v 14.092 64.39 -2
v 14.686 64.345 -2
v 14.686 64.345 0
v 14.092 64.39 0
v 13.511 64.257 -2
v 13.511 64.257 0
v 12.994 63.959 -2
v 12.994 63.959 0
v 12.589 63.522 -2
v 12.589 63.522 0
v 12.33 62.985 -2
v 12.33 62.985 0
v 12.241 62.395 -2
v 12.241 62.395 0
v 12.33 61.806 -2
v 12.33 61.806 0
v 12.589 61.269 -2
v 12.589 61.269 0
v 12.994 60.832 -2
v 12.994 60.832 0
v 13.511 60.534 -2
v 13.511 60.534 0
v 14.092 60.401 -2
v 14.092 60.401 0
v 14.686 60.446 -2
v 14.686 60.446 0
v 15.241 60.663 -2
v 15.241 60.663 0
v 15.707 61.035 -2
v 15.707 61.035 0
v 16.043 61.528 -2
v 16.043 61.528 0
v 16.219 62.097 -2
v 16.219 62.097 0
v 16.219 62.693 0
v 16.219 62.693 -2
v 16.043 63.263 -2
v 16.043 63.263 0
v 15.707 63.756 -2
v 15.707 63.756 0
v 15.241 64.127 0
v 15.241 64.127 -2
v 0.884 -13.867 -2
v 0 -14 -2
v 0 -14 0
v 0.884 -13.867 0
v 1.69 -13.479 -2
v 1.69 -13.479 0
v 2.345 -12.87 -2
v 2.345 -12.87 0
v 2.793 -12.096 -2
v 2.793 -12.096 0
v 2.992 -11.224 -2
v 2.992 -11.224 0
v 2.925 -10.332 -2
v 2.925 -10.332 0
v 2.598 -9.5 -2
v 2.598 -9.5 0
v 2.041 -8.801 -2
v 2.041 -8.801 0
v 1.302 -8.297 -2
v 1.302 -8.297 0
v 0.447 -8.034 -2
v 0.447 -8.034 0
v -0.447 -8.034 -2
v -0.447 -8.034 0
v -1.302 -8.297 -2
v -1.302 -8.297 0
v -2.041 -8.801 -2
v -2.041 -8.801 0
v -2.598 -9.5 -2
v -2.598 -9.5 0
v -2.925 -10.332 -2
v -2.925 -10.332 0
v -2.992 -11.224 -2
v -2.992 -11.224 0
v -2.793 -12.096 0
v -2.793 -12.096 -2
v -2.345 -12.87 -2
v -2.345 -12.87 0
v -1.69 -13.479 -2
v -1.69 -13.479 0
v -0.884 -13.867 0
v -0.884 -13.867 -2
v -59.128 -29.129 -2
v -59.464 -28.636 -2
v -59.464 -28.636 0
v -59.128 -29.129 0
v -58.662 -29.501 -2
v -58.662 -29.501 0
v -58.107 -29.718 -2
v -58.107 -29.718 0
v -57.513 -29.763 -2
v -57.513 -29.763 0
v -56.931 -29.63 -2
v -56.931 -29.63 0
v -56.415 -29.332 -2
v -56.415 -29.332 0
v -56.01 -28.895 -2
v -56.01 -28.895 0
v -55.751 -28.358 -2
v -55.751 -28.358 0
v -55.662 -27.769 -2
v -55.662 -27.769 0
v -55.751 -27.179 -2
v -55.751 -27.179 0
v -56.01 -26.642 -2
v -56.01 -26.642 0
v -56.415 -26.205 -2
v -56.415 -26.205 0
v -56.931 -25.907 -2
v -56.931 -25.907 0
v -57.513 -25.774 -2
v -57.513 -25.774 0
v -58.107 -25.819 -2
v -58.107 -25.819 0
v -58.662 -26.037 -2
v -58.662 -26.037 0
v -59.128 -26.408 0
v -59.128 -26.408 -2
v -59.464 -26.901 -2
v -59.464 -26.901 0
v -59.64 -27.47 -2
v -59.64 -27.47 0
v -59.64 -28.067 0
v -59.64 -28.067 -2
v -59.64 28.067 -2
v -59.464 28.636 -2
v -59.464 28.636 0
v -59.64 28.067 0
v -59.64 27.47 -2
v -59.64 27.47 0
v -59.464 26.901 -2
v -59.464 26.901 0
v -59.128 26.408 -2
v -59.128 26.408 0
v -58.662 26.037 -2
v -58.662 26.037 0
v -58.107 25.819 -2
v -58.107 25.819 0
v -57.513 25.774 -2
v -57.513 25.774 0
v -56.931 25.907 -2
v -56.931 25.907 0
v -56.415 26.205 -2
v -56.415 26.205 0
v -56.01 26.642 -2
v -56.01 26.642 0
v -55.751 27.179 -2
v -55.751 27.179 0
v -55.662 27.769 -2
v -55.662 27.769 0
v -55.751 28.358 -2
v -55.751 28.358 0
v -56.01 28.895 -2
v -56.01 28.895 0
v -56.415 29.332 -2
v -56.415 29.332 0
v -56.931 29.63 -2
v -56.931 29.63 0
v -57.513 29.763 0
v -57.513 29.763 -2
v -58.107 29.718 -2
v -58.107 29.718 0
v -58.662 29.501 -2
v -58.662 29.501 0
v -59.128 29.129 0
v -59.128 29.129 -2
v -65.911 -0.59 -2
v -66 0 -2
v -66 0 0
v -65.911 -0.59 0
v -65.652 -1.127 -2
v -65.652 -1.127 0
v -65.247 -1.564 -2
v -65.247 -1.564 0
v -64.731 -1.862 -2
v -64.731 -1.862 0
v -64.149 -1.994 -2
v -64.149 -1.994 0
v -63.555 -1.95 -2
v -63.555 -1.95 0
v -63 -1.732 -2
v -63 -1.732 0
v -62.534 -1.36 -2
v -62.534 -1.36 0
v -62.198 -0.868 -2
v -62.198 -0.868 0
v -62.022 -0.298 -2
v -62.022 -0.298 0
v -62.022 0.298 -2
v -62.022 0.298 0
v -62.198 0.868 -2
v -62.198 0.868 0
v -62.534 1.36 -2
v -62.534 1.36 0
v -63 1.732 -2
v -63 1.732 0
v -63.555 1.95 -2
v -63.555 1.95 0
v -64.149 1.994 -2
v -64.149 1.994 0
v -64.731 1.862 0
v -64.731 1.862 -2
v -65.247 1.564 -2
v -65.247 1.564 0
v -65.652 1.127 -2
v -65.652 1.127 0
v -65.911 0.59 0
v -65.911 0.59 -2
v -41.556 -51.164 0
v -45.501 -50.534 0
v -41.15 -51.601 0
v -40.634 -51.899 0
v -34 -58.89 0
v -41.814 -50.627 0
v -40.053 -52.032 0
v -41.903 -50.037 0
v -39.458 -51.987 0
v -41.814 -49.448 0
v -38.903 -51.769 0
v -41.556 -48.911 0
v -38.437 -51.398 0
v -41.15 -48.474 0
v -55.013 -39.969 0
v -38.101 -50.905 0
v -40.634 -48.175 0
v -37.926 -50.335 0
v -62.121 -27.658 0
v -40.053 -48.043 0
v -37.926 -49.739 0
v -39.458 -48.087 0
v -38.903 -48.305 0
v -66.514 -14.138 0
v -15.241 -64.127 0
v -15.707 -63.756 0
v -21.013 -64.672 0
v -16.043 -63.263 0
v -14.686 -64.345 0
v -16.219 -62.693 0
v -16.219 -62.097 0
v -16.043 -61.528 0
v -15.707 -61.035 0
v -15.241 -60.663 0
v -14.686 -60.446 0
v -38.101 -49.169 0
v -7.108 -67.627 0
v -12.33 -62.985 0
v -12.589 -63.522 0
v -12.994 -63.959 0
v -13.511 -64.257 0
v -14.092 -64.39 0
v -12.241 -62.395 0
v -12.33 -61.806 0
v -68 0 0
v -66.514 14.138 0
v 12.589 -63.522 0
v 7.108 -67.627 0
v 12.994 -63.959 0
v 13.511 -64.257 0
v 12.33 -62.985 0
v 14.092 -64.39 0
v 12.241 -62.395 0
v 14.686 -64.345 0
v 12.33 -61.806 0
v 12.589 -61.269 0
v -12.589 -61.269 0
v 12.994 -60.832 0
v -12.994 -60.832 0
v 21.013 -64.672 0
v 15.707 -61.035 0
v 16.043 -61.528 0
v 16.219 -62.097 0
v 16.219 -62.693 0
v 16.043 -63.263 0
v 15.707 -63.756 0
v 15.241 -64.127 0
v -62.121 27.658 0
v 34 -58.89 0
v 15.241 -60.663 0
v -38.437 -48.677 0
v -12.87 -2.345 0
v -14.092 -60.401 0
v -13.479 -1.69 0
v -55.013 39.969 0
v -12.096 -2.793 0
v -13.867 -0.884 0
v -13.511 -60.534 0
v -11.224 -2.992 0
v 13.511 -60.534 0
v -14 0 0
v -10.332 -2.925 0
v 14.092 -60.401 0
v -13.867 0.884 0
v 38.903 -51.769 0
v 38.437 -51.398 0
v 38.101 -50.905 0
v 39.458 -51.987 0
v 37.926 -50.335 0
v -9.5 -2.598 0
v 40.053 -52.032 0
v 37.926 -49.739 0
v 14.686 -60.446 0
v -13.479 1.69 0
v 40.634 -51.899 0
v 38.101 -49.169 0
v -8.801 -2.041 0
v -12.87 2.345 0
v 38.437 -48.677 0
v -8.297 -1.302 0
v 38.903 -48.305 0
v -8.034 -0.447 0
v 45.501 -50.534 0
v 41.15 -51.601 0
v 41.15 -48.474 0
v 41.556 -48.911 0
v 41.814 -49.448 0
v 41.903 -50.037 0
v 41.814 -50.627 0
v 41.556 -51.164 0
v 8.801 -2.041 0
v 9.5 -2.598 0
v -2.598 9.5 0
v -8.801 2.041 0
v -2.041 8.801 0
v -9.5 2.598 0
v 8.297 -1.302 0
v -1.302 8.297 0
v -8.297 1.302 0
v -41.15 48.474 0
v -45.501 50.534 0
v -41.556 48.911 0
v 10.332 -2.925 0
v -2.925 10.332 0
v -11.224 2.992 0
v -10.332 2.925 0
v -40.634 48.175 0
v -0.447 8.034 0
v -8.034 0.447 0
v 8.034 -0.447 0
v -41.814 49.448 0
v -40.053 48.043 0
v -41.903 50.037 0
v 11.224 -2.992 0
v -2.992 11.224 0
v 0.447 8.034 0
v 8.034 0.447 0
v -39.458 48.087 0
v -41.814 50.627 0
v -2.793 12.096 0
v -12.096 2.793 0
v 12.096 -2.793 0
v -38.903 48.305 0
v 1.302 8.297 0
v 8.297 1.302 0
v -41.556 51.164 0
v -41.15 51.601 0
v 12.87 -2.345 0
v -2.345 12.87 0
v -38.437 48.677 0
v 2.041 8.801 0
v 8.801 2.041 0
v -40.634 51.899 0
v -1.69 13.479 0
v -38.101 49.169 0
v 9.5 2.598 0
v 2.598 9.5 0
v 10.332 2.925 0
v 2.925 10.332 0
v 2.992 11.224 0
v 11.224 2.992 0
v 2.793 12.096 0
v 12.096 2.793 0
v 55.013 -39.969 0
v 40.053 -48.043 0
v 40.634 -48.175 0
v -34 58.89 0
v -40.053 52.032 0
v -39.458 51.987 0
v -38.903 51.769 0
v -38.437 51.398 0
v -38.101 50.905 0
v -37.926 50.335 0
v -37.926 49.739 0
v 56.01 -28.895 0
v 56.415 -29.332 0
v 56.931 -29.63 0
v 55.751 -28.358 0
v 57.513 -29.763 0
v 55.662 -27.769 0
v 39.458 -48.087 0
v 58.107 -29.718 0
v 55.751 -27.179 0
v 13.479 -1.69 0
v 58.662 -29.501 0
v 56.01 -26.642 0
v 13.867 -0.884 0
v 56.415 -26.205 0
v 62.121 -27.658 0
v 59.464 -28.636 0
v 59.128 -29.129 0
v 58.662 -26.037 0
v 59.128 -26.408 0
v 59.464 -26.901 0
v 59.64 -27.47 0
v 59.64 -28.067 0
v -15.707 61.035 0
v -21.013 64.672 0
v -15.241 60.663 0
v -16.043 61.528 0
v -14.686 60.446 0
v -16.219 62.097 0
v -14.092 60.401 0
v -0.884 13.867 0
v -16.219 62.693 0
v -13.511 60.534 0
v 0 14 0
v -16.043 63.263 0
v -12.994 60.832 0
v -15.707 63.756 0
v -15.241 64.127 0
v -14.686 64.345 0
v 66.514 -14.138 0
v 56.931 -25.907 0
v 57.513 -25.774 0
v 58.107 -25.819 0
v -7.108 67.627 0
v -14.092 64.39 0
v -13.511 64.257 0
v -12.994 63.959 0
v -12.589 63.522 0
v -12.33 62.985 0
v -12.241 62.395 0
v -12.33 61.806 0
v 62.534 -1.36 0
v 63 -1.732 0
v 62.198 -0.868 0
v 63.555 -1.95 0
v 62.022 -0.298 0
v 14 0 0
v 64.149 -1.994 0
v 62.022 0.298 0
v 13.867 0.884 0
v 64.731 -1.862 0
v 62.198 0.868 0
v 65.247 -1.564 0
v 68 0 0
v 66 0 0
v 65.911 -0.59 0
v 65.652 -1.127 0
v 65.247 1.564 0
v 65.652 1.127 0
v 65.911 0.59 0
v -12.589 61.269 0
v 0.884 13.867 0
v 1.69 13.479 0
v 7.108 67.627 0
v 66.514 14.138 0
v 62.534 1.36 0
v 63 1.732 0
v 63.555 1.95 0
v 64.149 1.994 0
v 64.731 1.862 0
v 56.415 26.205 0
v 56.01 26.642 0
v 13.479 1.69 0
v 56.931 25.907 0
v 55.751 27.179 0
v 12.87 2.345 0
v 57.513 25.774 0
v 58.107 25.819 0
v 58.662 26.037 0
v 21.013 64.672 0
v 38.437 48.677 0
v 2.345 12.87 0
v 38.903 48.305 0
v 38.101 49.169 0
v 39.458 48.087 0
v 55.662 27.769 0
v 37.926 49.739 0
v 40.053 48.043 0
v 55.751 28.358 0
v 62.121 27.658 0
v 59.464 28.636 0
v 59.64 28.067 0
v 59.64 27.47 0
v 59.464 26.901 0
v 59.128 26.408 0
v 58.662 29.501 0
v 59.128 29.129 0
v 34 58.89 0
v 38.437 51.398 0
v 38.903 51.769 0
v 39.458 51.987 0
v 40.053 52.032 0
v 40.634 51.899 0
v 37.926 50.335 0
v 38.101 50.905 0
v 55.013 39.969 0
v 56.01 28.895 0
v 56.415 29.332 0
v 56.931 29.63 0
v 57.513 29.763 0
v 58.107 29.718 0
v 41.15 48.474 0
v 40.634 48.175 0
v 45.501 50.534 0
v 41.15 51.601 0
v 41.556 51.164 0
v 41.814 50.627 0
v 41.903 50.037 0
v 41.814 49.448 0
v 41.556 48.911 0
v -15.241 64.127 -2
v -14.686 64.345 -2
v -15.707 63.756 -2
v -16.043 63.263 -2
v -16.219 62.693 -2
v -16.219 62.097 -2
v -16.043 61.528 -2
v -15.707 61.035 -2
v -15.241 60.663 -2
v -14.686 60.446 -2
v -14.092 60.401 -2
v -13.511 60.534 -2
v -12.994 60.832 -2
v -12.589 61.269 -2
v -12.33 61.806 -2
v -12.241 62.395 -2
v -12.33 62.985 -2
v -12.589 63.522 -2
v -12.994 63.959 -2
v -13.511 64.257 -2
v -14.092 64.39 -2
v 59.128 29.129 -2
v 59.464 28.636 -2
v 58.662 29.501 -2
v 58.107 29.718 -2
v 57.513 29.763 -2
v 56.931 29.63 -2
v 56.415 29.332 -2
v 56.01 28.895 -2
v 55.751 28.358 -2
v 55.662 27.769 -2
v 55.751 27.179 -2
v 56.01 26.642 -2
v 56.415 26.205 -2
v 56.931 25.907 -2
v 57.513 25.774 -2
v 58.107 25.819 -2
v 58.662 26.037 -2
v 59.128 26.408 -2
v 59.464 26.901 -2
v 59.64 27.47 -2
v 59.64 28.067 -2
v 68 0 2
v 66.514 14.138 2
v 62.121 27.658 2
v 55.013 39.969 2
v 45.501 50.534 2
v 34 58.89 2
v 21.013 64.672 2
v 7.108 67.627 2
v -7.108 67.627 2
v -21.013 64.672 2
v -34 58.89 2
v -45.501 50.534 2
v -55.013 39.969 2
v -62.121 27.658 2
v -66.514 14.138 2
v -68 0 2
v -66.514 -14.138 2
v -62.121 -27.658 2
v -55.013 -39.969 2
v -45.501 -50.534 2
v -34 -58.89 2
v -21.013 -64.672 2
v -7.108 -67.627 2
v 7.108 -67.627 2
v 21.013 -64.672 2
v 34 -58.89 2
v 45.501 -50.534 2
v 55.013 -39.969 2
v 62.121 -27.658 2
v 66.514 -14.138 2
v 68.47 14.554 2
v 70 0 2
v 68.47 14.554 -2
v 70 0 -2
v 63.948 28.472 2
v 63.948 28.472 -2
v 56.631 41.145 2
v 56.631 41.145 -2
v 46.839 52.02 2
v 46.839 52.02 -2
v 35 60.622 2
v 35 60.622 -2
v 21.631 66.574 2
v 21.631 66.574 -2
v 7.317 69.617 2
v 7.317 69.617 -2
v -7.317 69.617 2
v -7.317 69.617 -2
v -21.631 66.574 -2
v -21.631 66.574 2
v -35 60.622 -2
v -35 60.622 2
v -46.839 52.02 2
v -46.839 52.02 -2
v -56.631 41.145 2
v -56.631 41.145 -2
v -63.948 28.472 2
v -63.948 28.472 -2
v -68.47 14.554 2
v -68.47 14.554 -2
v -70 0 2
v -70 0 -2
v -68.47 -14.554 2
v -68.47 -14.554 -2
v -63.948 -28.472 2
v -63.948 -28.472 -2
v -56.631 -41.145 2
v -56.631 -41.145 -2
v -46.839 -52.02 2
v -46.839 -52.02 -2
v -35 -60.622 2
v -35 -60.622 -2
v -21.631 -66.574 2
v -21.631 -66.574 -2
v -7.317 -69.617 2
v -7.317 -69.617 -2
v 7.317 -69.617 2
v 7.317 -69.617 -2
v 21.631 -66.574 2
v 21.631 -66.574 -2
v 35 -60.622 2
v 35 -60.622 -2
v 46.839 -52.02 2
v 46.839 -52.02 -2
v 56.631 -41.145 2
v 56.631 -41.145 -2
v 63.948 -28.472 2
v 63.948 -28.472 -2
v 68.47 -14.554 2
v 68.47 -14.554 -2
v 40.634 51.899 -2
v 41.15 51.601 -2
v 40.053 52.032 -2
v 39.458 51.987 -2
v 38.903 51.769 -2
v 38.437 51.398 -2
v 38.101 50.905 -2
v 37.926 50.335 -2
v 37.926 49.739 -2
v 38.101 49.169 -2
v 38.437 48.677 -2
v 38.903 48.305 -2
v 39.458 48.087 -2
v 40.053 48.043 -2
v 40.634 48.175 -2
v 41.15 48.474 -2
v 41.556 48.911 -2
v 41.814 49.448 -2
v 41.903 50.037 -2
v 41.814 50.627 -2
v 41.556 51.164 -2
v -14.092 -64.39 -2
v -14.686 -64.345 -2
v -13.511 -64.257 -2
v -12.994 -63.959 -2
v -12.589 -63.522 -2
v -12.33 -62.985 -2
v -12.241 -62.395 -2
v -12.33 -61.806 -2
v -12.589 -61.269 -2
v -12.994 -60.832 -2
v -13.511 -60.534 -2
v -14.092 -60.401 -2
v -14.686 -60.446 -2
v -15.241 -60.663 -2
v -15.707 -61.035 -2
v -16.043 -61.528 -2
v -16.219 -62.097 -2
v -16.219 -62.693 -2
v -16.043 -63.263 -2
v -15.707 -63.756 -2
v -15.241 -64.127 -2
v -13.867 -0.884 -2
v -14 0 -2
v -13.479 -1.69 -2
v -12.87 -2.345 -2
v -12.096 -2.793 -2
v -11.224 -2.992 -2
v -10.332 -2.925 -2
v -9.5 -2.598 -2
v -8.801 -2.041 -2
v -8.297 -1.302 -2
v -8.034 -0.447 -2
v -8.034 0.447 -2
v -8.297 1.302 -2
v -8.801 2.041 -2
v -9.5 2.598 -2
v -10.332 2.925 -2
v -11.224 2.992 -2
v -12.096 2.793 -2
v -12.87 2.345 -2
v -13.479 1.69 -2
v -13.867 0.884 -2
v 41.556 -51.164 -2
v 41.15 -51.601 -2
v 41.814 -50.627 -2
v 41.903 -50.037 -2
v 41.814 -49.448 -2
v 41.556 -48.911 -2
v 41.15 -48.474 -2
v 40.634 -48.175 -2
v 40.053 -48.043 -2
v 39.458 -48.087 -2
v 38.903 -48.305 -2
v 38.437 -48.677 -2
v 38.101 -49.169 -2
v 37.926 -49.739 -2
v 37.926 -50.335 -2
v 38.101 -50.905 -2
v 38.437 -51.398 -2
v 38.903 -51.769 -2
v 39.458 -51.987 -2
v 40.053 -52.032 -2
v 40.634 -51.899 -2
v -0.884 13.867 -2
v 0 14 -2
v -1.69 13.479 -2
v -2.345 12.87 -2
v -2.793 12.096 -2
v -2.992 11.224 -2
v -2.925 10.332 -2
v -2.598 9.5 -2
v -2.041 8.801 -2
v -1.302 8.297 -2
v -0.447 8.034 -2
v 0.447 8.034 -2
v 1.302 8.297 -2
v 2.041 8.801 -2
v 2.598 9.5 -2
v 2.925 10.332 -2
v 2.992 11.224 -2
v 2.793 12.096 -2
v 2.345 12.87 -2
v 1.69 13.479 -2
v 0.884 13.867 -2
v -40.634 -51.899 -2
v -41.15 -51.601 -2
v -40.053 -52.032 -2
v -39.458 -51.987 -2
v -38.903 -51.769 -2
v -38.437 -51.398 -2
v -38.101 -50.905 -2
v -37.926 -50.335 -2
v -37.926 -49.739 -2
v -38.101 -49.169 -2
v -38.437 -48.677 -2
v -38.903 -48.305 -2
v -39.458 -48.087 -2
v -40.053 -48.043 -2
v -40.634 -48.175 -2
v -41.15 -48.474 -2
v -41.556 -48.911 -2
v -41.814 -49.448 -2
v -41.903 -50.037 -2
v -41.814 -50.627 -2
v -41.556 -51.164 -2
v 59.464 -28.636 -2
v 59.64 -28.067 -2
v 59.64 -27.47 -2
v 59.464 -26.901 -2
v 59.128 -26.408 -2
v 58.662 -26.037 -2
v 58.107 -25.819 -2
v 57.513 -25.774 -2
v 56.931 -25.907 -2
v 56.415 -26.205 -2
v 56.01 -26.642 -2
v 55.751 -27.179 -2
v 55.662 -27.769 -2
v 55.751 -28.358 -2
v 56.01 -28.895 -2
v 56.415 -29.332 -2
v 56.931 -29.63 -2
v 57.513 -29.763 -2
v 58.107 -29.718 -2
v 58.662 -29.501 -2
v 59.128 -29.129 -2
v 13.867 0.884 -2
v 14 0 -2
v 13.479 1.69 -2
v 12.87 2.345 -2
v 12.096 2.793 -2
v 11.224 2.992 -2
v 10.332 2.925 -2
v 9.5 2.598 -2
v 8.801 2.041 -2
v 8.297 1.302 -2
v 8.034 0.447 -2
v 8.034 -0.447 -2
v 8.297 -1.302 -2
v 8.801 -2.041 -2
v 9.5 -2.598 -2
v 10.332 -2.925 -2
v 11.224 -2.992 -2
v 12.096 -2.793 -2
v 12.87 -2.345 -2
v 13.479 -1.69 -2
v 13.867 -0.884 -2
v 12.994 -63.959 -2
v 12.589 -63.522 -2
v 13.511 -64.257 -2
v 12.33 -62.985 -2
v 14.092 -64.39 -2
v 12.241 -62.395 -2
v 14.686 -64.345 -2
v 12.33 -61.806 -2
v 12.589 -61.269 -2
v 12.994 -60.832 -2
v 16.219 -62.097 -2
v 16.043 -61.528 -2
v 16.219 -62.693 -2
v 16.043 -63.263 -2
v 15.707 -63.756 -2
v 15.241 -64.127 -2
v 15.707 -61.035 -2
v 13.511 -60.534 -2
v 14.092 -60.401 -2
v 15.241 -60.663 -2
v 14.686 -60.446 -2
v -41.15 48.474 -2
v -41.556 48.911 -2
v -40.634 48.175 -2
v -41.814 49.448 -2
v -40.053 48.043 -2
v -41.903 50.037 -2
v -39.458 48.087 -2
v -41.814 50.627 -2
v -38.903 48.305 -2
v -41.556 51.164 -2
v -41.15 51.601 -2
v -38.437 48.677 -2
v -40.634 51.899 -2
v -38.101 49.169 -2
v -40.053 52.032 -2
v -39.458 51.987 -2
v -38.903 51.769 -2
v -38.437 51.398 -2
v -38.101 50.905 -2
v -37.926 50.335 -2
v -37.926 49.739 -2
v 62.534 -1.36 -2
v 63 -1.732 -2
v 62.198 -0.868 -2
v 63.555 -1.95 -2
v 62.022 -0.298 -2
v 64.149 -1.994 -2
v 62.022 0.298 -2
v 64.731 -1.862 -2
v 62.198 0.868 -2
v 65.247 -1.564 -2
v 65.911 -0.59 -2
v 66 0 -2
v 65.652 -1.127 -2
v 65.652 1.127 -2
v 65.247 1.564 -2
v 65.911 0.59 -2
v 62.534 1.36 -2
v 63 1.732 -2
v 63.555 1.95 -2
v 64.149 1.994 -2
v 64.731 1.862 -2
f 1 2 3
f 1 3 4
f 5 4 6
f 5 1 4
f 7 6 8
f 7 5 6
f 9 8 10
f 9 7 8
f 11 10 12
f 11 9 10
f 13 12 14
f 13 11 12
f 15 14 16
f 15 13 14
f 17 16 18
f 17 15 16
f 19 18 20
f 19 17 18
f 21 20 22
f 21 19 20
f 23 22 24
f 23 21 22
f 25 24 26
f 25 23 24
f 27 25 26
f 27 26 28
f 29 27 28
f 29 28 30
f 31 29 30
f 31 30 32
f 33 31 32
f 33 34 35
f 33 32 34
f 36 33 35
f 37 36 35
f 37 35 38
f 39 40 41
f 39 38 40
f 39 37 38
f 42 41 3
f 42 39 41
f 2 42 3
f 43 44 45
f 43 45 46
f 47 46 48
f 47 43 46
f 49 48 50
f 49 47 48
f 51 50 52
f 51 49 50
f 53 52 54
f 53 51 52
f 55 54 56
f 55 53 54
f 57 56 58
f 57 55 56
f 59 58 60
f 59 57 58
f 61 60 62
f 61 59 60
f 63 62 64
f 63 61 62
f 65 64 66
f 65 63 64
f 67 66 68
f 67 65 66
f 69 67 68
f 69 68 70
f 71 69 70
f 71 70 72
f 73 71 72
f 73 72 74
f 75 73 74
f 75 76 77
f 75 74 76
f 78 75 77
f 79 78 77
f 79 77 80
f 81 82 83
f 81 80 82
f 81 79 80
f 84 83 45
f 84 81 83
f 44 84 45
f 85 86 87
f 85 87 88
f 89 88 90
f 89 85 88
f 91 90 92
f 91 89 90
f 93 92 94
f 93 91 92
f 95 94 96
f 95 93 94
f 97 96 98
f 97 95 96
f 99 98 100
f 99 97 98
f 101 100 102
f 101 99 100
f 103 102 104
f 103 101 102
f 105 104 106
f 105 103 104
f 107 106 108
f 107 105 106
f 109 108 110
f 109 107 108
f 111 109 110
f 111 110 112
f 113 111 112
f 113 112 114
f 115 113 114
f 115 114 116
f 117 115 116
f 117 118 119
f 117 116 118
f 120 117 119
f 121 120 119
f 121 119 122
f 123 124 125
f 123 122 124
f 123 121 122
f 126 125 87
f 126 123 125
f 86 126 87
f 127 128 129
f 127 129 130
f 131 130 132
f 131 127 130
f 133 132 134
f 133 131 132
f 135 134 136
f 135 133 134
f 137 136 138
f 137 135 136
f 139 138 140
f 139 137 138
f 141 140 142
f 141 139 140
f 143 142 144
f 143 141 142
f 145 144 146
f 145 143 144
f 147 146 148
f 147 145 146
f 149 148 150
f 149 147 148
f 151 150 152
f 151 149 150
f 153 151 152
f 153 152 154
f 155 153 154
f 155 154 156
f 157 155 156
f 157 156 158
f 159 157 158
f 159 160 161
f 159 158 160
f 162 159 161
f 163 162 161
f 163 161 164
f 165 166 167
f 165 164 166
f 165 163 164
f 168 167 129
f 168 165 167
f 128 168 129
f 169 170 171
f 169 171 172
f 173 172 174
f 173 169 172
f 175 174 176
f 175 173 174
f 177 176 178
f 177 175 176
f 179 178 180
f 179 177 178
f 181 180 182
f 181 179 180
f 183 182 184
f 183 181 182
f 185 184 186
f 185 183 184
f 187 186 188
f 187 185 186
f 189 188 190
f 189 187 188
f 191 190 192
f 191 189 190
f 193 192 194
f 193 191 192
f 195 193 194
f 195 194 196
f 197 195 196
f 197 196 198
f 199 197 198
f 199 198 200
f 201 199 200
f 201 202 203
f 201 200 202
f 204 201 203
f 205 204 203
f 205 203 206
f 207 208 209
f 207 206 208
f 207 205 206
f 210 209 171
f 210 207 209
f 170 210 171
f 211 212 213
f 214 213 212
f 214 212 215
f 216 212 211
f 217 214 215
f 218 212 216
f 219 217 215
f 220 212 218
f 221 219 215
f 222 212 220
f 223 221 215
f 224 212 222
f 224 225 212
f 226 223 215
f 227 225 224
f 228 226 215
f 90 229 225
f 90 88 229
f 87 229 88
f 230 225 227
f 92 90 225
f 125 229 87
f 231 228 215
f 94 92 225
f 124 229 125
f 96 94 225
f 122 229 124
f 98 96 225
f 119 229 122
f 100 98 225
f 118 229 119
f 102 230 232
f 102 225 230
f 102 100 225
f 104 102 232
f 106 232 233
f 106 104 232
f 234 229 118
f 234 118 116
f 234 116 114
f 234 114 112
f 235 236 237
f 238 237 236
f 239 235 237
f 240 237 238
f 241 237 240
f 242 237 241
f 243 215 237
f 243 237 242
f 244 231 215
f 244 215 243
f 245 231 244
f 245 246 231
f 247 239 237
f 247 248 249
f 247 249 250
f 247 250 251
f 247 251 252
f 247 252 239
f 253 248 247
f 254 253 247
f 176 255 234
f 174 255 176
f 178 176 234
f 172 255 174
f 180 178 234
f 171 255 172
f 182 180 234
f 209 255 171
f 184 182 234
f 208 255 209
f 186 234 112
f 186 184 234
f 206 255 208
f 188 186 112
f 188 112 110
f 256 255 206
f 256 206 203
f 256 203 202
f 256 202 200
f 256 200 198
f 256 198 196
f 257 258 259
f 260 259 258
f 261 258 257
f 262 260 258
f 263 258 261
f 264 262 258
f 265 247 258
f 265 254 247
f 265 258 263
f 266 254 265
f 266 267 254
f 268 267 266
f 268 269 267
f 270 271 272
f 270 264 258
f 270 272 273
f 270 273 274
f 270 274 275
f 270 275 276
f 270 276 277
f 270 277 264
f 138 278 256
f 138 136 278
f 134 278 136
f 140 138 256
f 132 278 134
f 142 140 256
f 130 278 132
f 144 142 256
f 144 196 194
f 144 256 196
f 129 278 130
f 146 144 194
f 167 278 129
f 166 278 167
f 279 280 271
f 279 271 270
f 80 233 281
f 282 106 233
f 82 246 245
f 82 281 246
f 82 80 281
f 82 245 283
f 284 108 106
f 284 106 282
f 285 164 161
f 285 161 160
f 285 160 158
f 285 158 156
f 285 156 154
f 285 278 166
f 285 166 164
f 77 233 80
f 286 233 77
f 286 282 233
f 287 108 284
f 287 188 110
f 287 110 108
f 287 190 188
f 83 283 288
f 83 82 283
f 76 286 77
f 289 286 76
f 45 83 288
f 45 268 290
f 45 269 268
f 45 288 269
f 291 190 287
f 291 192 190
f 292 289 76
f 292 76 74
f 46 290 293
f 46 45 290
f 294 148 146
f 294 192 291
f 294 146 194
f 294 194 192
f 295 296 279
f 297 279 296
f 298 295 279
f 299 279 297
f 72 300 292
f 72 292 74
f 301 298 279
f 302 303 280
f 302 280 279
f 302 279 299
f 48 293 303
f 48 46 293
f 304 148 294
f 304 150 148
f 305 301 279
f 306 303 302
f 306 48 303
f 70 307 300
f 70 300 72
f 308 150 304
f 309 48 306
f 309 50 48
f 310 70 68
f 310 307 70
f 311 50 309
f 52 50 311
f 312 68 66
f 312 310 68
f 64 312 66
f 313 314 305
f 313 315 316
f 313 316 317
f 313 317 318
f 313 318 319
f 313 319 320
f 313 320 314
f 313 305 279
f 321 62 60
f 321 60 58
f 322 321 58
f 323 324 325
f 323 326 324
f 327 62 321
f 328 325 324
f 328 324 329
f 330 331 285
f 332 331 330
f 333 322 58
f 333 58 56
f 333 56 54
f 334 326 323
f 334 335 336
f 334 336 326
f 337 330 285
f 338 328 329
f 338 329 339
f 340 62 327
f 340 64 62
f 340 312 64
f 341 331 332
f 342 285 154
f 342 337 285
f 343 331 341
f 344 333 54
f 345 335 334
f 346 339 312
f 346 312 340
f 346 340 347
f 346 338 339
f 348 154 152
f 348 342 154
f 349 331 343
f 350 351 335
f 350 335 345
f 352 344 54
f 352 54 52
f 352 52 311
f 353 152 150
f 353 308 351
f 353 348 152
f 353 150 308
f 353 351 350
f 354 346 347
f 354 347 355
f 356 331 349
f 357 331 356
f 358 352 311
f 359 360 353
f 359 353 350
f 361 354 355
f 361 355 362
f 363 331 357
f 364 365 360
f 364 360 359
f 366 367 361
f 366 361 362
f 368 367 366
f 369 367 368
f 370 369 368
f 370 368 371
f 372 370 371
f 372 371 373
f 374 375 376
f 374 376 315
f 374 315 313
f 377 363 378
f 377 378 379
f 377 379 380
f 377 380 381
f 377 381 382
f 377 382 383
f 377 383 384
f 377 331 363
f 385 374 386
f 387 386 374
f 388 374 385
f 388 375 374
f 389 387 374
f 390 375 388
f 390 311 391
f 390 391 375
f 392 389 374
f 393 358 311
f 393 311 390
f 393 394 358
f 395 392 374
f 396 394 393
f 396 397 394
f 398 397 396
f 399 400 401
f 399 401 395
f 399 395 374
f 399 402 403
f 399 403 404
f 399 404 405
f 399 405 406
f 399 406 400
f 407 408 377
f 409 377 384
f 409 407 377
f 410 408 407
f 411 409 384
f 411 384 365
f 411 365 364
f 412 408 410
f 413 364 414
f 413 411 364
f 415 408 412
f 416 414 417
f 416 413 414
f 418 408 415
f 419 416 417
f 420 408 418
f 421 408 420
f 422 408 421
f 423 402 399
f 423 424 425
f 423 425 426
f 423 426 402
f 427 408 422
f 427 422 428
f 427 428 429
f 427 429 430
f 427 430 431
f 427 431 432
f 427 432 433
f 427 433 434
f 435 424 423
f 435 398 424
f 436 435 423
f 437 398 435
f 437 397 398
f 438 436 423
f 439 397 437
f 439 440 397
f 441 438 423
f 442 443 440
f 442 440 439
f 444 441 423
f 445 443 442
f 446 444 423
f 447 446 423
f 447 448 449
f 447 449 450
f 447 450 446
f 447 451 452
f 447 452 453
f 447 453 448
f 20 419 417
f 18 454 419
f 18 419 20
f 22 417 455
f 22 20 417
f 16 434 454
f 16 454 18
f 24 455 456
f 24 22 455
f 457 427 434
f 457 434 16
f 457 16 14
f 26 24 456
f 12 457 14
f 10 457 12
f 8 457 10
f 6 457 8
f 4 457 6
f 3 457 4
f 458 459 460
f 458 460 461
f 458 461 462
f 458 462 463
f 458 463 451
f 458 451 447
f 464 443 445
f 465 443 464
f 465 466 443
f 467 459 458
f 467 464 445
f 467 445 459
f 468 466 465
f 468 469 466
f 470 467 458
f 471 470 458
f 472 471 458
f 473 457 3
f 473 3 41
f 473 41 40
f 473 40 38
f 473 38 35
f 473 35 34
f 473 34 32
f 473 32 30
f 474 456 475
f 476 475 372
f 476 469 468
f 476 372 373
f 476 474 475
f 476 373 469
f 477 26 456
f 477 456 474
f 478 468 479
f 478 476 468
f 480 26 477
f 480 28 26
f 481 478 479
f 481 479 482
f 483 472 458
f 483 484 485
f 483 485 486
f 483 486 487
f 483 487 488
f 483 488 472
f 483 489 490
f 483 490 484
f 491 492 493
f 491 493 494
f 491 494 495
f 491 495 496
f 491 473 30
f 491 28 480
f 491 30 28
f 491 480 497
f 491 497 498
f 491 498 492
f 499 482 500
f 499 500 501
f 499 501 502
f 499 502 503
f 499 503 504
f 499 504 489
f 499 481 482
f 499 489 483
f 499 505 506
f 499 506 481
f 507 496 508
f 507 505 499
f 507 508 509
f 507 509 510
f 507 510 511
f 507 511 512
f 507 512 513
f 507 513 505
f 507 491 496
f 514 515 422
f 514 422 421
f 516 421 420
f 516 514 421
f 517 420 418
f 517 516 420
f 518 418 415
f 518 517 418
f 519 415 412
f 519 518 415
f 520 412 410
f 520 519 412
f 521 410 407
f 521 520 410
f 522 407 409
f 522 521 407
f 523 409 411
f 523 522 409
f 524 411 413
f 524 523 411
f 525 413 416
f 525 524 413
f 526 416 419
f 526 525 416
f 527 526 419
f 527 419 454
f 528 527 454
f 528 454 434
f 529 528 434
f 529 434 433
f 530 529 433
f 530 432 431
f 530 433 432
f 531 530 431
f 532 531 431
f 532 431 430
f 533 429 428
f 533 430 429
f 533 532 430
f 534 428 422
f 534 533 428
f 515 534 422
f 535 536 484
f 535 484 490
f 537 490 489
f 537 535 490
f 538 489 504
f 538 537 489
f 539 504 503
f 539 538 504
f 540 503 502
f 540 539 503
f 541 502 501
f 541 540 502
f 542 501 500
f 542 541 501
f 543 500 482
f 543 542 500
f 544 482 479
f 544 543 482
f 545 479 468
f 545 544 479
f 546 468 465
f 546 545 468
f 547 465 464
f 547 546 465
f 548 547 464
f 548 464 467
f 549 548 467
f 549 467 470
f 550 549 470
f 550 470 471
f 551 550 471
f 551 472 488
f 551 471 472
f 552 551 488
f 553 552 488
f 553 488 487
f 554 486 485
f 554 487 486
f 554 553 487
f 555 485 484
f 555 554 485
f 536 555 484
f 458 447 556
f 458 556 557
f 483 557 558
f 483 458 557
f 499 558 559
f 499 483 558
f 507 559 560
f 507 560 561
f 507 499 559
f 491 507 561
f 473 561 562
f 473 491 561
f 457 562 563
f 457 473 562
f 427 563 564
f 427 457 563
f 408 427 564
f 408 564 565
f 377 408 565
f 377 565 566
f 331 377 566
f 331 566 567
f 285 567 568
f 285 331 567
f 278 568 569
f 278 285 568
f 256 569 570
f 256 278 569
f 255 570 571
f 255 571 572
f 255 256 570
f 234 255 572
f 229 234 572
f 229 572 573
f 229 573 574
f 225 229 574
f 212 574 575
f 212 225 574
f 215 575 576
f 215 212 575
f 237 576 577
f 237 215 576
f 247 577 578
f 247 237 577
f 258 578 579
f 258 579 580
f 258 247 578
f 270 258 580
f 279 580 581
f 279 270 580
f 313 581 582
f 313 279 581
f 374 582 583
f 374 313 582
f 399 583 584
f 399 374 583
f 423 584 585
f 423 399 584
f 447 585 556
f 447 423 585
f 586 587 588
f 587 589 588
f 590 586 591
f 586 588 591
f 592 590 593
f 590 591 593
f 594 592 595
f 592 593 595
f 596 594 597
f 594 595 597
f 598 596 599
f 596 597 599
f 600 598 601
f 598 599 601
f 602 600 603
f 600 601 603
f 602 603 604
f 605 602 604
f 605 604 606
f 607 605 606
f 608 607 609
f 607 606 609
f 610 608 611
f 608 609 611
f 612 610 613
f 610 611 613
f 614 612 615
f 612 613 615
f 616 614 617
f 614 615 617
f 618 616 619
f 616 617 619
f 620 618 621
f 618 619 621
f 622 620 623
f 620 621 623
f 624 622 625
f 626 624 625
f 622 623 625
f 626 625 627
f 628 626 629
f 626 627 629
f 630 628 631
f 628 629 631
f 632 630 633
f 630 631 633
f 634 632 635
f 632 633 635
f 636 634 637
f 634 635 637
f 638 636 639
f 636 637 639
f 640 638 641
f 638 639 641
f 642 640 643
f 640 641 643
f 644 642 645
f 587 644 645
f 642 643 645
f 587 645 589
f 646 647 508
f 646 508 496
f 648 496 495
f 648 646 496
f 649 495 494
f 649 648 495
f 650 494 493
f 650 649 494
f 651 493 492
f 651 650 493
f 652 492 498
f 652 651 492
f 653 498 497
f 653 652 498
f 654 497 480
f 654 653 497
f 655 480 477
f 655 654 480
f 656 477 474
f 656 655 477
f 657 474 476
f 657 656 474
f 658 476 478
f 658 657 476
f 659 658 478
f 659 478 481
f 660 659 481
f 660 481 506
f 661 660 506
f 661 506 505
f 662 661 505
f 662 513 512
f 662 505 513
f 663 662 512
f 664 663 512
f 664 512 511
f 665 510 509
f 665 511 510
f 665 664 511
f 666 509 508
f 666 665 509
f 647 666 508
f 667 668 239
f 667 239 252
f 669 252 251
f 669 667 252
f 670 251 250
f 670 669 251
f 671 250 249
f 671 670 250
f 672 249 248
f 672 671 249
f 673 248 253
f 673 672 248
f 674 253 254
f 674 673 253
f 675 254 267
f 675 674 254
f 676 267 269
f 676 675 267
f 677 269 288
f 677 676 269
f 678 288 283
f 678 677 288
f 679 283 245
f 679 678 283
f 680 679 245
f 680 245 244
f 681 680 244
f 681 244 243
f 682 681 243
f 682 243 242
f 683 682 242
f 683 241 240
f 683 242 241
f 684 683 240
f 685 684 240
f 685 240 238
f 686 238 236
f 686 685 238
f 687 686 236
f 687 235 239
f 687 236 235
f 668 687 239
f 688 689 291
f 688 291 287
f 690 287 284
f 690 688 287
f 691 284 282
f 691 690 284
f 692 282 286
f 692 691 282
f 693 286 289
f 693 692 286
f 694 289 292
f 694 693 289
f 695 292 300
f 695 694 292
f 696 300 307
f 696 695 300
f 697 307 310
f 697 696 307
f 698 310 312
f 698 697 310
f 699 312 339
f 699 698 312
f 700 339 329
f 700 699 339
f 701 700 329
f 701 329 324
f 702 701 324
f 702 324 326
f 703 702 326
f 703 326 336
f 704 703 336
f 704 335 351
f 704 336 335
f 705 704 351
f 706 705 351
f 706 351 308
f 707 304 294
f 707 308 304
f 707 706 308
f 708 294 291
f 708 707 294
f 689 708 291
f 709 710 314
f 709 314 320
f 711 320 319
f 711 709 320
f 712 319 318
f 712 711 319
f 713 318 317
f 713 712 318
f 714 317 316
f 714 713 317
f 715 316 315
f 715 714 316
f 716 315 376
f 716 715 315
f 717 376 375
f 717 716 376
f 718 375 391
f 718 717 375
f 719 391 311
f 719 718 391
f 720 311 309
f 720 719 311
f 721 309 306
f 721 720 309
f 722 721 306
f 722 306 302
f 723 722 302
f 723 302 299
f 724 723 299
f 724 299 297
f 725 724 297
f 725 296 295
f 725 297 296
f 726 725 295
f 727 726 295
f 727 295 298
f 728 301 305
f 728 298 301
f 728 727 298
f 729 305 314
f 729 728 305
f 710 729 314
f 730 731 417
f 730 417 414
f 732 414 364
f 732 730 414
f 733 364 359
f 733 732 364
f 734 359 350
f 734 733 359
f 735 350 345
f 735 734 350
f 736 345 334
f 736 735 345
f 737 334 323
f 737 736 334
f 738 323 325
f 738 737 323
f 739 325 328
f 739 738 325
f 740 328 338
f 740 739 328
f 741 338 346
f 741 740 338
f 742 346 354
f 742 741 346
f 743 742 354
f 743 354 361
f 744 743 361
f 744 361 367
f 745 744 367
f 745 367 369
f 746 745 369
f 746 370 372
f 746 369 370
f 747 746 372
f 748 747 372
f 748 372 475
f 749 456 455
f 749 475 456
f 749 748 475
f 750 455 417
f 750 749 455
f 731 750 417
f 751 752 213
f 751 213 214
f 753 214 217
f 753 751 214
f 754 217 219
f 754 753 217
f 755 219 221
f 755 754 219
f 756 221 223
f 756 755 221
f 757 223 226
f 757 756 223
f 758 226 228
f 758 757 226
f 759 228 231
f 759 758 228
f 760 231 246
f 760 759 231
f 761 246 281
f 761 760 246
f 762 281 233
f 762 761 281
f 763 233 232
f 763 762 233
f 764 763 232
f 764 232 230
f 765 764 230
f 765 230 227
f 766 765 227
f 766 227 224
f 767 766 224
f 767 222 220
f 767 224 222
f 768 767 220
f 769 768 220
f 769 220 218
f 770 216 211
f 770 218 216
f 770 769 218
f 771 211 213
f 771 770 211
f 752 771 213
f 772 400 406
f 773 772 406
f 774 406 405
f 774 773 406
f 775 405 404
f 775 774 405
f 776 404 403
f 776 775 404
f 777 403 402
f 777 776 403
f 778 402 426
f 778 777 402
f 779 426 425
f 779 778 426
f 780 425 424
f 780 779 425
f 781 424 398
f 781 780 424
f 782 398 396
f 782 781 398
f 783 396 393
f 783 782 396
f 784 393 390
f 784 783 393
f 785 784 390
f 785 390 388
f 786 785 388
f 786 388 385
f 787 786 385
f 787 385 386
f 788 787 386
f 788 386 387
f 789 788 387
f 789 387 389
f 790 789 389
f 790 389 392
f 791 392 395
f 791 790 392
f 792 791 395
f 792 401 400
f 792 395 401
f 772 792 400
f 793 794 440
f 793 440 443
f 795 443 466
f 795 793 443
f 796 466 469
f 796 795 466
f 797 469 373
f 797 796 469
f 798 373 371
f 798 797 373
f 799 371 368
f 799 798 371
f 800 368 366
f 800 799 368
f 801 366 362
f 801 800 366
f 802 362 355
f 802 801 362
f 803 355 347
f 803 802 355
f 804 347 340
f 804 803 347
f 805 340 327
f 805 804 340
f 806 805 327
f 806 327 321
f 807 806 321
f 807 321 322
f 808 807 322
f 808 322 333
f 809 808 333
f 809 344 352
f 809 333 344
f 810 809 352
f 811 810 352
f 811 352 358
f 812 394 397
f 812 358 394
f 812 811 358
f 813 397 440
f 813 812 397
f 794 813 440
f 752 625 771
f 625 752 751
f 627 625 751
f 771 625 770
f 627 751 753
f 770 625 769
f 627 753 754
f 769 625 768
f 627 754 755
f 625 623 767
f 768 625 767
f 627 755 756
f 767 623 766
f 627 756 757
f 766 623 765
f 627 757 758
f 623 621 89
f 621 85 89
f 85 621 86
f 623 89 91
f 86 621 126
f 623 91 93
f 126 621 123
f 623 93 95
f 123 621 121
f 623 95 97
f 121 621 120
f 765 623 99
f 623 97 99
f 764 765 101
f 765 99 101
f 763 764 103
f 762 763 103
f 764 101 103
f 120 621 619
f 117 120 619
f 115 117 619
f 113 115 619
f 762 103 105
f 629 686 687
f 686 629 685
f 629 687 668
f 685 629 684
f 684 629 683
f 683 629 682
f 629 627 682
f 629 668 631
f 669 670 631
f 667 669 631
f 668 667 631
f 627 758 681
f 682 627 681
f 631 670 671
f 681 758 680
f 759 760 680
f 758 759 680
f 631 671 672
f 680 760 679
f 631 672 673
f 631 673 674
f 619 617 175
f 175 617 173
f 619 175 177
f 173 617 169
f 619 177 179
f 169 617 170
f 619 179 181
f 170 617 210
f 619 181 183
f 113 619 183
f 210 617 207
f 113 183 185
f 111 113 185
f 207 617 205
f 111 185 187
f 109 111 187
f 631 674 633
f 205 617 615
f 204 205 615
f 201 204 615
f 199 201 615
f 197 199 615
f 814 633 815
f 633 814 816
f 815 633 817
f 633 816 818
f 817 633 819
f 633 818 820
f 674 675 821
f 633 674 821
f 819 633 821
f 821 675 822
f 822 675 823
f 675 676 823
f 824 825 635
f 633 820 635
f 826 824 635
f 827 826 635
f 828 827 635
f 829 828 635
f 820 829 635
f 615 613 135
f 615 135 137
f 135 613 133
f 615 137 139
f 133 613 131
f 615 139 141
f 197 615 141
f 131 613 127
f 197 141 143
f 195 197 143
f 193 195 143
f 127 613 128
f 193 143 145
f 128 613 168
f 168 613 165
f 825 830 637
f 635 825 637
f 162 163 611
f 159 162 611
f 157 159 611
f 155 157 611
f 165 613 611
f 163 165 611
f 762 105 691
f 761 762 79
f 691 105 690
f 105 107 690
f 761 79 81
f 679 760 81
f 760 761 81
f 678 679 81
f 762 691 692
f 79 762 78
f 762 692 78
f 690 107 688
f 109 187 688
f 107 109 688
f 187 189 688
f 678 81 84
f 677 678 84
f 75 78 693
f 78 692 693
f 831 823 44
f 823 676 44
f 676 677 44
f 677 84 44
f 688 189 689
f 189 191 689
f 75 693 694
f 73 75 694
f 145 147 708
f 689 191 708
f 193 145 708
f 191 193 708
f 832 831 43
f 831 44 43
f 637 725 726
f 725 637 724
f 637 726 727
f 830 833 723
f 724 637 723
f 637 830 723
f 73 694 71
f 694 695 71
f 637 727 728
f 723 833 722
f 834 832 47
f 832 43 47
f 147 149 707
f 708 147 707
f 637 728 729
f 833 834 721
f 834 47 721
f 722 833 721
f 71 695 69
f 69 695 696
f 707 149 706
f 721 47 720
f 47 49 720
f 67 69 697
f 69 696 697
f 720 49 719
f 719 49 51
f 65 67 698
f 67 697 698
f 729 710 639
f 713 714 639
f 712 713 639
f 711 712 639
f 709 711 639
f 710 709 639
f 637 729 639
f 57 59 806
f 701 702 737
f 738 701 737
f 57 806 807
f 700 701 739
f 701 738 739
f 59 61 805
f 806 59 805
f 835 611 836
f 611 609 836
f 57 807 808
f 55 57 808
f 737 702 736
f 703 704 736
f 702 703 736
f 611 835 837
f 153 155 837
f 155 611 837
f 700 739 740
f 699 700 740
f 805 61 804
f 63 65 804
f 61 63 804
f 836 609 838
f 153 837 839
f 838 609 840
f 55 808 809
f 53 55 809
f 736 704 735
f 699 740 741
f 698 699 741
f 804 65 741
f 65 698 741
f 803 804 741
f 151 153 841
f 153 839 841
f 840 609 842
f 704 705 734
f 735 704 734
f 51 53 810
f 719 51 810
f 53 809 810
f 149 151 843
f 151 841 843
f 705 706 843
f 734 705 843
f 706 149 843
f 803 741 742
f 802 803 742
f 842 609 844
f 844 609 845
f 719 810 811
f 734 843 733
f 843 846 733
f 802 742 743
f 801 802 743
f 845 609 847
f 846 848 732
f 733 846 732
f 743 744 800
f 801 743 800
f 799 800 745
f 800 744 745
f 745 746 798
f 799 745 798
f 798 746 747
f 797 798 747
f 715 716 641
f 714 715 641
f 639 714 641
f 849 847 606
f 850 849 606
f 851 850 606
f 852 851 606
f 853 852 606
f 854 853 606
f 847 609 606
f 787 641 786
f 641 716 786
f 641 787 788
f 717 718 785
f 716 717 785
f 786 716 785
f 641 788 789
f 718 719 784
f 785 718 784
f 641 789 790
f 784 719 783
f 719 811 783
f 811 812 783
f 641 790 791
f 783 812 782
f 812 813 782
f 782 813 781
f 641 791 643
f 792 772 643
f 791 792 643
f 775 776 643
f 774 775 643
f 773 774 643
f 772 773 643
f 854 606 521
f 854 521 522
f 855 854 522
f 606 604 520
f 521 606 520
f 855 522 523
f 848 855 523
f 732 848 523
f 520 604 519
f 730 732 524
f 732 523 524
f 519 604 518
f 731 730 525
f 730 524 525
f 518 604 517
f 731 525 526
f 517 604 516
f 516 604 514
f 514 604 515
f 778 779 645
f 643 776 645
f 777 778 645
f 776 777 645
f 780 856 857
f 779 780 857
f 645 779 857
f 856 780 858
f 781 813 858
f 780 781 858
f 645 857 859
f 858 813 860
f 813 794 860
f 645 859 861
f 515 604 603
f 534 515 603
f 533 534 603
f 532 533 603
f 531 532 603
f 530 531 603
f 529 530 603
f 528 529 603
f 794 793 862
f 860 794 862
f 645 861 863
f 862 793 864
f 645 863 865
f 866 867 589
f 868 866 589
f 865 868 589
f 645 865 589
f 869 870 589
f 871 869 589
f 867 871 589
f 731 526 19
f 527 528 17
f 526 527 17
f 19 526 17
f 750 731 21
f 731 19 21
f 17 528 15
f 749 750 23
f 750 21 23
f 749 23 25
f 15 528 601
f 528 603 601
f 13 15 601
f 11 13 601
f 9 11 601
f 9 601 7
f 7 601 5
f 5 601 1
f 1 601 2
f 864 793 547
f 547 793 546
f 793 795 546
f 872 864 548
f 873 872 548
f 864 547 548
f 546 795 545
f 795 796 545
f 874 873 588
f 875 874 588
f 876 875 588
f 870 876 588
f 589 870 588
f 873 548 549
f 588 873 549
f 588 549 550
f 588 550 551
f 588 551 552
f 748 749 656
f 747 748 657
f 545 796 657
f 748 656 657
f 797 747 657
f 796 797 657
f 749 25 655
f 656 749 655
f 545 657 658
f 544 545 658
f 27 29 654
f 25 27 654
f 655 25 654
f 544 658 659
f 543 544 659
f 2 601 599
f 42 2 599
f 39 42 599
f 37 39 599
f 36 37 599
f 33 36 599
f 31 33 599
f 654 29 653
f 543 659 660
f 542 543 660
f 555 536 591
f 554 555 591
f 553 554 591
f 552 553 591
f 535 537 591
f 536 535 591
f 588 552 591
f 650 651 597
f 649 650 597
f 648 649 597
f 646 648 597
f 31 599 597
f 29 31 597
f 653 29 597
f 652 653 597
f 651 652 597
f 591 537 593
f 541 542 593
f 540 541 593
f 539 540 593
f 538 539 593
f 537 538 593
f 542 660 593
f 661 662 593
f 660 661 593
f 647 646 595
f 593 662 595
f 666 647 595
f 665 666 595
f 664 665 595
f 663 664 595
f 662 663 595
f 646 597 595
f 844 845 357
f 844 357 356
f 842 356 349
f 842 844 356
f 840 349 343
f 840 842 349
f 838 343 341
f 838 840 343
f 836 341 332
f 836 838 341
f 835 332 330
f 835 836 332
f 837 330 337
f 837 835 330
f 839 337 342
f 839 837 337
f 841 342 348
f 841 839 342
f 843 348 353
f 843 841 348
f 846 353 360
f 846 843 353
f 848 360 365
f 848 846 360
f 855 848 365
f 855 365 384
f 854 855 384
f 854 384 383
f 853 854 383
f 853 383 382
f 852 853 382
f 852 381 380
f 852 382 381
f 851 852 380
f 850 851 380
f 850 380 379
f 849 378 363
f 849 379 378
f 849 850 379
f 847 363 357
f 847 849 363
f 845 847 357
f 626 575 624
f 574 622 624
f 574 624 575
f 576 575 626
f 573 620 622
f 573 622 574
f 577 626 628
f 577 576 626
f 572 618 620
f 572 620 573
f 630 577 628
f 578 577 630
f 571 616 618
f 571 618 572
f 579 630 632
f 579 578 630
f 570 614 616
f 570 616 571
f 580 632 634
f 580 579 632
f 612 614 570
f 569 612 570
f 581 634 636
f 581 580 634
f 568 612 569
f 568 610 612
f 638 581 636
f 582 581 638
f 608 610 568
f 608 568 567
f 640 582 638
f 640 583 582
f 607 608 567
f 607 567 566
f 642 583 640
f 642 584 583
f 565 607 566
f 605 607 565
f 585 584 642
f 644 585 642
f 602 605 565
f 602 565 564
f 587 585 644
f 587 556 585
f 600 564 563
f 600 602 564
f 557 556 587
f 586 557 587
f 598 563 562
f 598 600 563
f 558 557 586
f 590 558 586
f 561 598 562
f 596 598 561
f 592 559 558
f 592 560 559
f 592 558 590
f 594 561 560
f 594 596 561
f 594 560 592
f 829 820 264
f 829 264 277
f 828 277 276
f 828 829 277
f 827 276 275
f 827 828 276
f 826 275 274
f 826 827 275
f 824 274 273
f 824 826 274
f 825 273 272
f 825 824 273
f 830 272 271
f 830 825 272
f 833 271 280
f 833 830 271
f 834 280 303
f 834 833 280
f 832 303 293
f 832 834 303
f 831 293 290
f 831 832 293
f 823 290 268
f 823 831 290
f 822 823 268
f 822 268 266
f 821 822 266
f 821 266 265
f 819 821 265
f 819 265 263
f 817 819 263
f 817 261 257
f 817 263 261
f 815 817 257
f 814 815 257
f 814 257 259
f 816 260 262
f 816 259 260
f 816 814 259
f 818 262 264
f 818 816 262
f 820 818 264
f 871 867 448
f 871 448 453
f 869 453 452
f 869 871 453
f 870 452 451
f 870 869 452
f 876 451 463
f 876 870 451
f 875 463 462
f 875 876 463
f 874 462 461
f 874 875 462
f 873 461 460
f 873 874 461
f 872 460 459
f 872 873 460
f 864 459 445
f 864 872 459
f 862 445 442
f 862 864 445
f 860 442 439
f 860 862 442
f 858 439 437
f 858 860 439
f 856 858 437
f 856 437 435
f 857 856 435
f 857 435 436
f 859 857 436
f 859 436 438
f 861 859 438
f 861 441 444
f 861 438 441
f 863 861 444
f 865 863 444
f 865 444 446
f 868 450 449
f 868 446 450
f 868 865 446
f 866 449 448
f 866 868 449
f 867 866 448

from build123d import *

# Parameters (mm, degrees)
SKETCH_R          = 70
SKETCH_R_2        = 68
PAD_DEPTH         = 2
CYLINDER001_R     = 2
CYLINDER001_DEPTH = 4
ARRAY001_COUNT    = 14
CYLINDER_R        = 3
CYLINDER_DEPTH    = 4
ARRAY_COUNT       = 4
SKETCH002_R       = 70
PAD001_DEPTH      = 2


with BuildPart() as body:
    # Sketch → Pad (new body)
    with BuildSketch(Plane.XY):
        Circle(SKETCH_R)
        Circle(SKETCH_R_2, mode=Mode.SUBTRACT)
    extrude(amount=PAD_DEPTH)


with BuildPart() as array001:
    # Cylinder001 → Cylinder001 (new body)
    with BuildSketch(Plane(origin=(64, 0, -3), x_dir=(1, 0, 0), z_dir=(0, 0, 1))):
        Circle(CYLINDER001_R)
    extrude(amount=CYLINDER001_DEPTH)

    # Array001: Array001 ×14 about axis
    array001_axis = Axis((0, 0, 0), (0, 0, 1))


with BuildPart() as array001_1:
    add(array001.part)
    for i in range(1, ARRAY001_COUNT):
        add(array001.part.rotate(array001_axis, i * 360 / ARRAY001_COUNT))


with BuildPart() as array:
    # Cylinder → Cylinder (new body)
    with BuildSketch(Plane(origin=(11, 0, 0), x_dir=(1, 0, 0), z_dir=(0, 0, 1))):
        Circle(CYLINDER_R)
    extrude(amount=CYLINDER_DEPTH)

    # Array: Array ×4 about axis
    array_axis = Axis((0, 0, 0), (0, 0, 1))


with BuildPart() as array_1:
    add(array.part)
    for i in range(1, ARRAY_COUNT):
        add(array.part.rotate(array_axis, i * 360 / ARRAY_COUNT))


with BuildPart() as array_2:
    # Array placement: moved
    add(array_1.part.moved(Location((0, 0, -3))))


with BuildPart() as fusion:
    # Sketch002 → Pad001 (new body)
    with BuildSketch(Plane.XY):
        Circle(SKETCH002_R)
    extrude(amount=PAD001_DEPTH)


with BuildPart() as fusion_1:
    # Body001 placement: moved
    add(fusion.part.moved(Location((0, 0, -2))))

    # Cut: cut Array
    add(array_2.part, mode=Mode.SUBTRACT)

    # Cut001: cut Array001
    add(array001_1.part, mode=Mode.SUBTRACT)

    # Fusion: union Body
    add(body.part)


solid = fusion_1.part
